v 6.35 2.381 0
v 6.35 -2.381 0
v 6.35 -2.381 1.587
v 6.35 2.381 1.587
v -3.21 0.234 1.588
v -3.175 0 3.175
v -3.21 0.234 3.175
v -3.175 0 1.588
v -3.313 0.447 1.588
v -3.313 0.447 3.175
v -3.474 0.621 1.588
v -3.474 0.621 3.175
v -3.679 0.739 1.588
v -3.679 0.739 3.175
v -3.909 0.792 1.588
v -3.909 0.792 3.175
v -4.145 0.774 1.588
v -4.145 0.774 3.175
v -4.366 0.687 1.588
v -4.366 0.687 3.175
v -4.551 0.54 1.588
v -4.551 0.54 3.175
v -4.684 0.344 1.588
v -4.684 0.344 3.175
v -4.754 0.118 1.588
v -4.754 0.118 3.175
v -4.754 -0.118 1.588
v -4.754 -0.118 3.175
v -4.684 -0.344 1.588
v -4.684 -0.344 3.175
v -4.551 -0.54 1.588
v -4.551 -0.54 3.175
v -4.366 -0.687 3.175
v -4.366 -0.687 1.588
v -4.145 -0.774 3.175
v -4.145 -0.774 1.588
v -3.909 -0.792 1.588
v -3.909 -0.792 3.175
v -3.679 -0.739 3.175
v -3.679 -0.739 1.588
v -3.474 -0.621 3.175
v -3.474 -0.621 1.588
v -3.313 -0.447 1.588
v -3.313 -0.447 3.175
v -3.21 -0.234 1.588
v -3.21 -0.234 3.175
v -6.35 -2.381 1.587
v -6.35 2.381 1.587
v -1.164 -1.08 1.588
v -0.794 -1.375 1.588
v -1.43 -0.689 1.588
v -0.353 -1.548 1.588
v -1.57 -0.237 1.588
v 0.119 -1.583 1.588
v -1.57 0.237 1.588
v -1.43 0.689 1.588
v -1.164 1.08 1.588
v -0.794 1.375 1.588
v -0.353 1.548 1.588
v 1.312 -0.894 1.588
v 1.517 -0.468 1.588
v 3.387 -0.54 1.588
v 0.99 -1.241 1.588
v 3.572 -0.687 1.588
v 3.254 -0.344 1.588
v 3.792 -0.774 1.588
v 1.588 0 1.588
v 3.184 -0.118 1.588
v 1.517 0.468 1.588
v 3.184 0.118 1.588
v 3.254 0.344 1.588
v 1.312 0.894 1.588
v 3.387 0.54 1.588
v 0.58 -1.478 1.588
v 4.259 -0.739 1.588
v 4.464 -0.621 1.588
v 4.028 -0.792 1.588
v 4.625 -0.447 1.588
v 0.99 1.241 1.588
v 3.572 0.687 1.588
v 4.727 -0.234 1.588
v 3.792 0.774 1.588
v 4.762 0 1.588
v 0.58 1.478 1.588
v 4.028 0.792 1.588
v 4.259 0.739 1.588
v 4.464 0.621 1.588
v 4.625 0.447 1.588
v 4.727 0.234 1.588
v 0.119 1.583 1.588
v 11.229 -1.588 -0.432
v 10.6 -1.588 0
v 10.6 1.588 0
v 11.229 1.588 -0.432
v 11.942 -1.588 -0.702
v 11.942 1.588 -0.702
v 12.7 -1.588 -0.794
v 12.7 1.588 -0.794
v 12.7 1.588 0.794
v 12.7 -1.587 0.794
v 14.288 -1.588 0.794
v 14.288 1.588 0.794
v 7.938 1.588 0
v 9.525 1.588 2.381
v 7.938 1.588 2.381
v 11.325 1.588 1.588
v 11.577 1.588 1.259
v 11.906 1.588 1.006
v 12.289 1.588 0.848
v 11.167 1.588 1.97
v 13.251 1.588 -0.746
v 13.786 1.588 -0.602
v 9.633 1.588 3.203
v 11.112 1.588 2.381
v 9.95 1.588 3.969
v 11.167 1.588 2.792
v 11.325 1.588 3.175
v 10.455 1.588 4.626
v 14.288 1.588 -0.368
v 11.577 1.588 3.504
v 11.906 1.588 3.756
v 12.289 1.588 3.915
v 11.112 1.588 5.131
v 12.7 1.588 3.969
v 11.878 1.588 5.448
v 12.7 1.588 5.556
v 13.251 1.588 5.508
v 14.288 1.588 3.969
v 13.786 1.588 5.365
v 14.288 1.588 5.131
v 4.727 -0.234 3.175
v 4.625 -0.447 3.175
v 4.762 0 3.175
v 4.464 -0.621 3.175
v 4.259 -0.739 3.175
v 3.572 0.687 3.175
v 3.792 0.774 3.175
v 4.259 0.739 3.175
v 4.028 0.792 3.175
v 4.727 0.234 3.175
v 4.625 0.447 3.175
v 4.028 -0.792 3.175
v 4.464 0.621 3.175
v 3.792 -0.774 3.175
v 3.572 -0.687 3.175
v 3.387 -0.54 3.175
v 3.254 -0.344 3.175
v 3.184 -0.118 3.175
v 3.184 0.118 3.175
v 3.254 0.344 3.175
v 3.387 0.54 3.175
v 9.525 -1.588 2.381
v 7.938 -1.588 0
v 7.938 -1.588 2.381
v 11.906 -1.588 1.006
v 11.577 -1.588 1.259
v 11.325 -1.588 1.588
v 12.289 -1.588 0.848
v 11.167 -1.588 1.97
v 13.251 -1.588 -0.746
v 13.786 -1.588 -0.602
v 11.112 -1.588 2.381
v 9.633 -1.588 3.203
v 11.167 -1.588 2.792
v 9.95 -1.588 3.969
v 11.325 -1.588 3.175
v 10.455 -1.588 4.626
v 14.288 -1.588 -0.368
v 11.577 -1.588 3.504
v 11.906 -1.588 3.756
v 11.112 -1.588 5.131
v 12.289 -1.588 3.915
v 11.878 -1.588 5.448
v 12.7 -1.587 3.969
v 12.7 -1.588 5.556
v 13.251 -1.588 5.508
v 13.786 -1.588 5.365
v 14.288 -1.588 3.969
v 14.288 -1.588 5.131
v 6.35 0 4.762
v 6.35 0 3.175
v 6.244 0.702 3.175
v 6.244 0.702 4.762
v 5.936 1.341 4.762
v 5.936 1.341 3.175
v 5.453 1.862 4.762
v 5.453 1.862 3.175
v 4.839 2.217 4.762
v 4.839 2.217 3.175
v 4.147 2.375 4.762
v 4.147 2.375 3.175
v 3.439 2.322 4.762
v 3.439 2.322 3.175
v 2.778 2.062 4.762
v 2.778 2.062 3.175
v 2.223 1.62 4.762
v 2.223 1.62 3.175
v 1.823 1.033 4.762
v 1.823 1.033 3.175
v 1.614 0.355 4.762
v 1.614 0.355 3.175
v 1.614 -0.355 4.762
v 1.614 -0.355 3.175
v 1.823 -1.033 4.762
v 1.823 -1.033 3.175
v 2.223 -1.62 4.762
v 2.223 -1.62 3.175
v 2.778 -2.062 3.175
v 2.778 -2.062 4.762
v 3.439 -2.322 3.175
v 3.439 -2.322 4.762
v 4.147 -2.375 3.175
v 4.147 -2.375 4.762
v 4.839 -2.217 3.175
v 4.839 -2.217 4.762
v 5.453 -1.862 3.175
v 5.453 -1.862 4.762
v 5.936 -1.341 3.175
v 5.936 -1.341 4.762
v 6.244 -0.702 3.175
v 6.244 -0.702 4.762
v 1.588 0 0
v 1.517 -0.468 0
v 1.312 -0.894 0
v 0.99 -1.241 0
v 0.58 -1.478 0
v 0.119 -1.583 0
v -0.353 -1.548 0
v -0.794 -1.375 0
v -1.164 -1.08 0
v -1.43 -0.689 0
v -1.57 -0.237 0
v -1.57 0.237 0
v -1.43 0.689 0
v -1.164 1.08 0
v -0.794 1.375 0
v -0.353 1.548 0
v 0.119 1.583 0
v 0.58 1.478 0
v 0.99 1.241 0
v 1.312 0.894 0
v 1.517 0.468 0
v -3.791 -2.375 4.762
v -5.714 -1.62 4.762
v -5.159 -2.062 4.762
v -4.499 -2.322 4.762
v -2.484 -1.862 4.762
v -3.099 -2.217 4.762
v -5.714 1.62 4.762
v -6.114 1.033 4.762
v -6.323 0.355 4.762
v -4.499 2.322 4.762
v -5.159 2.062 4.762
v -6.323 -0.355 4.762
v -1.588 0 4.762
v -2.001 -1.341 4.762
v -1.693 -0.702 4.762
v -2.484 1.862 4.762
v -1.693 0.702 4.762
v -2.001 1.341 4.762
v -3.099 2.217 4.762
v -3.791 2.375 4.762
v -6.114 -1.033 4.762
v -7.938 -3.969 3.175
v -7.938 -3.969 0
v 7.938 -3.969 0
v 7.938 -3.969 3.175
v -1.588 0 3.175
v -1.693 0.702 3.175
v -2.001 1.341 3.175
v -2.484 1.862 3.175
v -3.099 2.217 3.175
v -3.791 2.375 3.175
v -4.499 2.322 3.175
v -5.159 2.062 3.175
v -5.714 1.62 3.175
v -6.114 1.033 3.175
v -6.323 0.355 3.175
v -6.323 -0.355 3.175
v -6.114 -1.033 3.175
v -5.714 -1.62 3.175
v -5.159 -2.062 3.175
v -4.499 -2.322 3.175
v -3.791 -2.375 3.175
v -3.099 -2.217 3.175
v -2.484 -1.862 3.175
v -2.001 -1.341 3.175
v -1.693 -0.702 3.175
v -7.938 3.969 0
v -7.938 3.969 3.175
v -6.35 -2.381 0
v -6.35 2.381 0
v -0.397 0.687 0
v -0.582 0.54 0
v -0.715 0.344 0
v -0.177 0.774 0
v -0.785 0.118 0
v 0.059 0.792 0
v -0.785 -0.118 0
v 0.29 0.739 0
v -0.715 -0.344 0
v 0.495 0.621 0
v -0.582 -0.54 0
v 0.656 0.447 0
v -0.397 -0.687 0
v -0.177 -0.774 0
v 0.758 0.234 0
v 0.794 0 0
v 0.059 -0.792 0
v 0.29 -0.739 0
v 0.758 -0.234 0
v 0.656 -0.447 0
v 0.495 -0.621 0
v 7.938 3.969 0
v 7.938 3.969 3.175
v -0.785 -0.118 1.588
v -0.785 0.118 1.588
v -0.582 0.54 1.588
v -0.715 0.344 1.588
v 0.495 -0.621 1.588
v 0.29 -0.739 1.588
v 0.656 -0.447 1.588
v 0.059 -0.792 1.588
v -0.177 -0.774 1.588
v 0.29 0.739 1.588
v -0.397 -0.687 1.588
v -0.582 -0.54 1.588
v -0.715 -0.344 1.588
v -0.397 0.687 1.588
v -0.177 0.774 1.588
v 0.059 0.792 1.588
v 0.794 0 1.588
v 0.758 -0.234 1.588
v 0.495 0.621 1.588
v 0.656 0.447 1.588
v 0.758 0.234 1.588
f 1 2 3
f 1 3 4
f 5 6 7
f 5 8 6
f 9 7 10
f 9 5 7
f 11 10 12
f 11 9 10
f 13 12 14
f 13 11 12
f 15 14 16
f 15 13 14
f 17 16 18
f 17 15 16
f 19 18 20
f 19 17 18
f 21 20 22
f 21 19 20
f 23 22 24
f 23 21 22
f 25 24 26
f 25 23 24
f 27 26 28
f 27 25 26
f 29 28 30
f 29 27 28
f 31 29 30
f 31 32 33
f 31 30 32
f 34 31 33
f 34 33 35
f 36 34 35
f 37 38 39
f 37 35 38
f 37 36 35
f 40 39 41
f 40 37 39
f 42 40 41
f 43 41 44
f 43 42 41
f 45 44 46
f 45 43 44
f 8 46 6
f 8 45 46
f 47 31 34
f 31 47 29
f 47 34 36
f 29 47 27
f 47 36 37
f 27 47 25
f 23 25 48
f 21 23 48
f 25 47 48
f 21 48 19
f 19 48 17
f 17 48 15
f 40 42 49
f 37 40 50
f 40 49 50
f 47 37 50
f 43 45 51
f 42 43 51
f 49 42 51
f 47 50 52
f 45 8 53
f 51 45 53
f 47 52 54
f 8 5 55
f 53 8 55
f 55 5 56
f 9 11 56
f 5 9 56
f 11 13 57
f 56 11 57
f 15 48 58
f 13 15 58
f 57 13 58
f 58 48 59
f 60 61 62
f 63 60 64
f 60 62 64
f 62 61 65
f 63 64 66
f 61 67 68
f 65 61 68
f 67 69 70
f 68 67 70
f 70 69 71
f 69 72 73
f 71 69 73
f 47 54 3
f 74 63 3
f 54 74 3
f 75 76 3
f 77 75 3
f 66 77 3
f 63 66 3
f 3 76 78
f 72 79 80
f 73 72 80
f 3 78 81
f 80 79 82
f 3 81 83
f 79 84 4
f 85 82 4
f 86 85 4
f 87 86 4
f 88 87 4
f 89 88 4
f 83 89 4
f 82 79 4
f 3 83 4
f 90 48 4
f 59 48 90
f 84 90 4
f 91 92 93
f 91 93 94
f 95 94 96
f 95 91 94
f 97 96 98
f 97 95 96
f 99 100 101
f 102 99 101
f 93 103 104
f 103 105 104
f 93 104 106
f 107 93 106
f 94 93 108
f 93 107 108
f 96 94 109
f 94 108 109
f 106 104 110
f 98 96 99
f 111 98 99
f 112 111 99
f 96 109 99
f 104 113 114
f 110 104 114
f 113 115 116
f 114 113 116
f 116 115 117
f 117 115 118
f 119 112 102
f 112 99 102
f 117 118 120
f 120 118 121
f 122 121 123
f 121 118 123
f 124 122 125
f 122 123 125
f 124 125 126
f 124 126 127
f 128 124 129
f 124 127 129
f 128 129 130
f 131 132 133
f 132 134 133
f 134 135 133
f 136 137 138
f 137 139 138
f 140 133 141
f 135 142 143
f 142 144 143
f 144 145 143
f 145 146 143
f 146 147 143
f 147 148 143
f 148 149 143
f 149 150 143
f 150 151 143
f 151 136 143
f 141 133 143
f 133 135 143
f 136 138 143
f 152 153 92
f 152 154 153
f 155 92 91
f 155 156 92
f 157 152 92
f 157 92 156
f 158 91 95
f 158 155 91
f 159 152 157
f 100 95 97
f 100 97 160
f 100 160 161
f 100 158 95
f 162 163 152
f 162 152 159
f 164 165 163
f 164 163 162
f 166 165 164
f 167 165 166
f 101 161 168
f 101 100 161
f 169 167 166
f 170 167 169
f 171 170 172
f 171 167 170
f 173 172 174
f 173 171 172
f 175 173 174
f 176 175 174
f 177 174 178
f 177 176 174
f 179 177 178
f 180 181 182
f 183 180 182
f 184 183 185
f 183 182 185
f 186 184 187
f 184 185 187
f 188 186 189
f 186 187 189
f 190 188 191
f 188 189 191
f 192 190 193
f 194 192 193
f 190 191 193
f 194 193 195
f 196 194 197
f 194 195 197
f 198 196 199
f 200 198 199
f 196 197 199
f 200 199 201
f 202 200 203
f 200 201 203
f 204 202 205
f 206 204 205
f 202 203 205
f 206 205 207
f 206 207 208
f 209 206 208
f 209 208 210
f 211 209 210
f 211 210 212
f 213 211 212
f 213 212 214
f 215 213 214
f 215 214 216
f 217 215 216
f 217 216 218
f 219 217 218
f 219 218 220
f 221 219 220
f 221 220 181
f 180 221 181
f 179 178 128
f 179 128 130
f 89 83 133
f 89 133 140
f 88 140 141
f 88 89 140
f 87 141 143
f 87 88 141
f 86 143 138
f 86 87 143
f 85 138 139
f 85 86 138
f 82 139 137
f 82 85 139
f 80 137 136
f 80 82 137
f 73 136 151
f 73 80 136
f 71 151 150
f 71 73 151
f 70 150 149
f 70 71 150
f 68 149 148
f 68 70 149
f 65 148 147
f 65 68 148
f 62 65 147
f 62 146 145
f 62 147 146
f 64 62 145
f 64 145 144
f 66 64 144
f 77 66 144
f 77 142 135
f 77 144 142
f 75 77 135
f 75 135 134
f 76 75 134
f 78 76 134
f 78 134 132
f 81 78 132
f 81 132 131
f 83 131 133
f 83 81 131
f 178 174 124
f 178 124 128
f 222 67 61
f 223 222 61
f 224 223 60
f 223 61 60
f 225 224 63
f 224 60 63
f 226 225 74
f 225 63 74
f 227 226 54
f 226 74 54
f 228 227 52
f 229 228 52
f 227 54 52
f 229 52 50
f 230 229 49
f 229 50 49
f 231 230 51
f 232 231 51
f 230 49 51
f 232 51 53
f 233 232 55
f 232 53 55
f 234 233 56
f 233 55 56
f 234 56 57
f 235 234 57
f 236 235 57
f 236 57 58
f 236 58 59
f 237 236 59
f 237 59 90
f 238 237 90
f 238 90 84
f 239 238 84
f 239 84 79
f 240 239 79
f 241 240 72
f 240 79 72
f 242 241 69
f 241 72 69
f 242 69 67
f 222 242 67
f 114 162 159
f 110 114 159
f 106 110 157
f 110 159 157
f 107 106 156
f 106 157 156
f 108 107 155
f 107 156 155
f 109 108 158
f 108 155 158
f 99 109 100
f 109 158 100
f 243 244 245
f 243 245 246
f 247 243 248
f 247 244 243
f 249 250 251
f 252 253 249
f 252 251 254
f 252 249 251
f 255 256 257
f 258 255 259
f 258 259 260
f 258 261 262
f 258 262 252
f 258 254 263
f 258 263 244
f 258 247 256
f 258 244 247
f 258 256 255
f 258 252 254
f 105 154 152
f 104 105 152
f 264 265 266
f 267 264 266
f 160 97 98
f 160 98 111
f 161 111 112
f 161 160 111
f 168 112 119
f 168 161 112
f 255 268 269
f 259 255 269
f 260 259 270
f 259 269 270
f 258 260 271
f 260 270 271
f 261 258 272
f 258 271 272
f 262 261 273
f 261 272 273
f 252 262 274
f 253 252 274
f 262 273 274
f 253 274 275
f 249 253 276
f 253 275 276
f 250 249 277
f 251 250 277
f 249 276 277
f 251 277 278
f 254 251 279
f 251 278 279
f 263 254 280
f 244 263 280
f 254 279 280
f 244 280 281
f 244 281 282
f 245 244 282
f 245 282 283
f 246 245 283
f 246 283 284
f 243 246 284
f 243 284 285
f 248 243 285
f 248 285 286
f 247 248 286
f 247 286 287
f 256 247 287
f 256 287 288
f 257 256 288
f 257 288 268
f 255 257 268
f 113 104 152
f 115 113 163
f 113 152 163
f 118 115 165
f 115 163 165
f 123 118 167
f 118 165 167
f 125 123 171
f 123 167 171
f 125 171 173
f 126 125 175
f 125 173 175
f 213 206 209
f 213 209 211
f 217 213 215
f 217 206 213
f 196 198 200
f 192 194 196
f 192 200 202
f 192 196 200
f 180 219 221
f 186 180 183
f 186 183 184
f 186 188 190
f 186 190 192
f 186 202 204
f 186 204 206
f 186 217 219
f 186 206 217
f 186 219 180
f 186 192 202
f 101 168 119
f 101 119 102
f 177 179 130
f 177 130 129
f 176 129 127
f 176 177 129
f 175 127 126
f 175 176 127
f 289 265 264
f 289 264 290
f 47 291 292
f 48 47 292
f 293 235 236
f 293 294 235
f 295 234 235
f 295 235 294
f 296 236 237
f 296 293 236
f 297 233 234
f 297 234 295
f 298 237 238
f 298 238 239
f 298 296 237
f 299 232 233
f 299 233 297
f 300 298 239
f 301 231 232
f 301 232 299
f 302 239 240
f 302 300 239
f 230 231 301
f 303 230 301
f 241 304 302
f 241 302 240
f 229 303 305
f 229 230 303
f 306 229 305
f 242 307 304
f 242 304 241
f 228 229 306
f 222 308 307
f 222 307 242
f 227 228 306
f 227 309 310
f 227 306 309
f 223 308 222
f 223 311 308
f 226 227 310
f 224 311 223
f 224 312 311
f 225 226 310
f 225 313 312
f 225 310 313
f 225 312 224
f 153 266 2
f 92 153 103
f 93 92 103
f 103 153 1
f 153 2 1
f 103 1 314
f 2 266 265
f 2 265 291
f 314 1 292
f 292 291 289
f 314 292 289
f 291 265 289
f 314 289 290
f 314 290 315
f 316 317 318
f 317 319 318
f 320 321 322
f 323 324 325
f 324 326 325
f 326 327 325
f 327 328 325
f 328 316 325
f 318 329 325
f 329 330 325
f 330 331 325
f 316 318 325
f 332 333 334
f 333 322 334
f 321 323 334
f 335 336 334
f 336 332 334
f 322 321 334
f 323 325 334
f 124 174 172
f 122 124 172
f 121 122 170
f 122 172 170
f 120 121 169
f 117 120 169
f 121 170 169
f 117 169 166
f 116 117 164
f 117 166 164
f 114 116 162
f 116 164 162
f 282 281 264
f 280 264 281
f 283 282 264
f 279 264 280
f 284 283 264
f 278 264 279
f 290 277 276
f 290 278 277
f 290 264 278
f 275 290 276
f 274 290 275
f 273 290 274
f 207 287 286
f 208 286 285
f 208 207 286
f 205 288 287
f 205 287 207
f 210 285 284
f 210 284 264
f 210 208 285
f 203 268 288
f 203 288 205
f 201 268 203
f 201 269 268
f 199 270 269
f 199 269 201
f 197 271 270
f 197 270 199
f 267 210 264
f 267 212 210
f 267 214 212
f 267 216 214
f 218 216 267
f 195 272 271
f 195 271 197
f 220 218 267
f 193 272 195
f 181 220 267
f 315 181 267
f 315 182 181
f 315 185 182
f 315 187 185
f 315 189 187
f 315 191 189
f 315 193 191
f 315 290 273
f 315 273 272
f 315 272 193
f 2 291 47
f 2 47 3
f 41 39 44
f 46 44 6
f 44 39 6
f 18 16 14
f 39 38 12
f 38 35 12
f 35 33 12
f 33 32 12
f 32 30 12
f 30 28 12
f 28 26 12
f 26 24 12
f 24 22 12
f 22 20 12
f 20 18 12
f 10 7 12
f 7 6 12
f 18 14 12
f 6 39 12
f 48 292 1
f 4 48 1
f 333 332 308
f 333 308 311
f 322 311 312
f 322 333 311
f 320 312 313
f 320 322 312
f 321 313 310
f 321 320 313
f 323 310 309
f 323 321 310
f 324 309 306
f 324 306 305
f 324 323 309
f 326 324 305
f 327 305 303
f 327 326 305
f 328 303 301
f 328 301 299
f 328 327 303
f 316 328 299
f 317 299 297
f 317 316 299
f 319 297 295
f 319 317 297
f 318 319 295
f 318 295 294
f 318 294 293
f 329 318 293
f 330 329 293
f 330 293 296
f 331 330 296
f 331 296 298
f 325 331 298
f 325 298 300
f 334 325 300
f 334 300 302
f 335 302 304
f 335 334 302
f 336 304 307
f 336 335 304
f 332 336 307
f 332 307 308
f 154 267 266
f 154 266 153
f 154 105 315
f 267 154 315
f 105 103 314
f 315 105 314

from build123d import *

# Parameters (mm, degrees)
F0_W      = 15.875
F0_H      = 7.9375
F0_R      = 2.38125
F1_DEPTH  = 3.175
F2_DEPTH  = 4.7625
F3_T      = -1.5875
F4_R      = 1.5875
F4_R_2    = 0.79375
F5_DEPTH  = 1.5875
F6_W      = 1.5875
F6_H      = 6.35
F7_DEPTH  = 4.7625
F8_W      = 1.5875
F8_H      = 0.79375
F9_DEPTH  = 3.175
F10_DEPTH = 25.4


with BuildPart() as f1:
    # F0 (on Top) → F1 (new body)
    with BuildSketch(Plane.XY):
        Rectangle(F0_W, F0_H)
        with Locations((-3.96875, 0)):
            Circle(F0_R, mode=Mode.SUBTRACT)
        with Locations((3.96875, 0)):
            Circle(F0_R, mode=Mode.SUBTRACT)
    extrude(amount=F1_DEPTH)

    # F0 (on Top) → F2 (join)
    with BuildSketch(Plane.XY):
        with Locations((3.96875, 0)):
            Circle(F0_R)
        with Locations((-3.96875, 0)):
            Circle(F0_R)
    extrude(amount=F2_DEPTH)

    # F3
    f3_openings = [f1.faces().sort_by_distance(p)[0] for p in [
        (0, 0, 0),
    ]]
    offset(amount=F3_T, openings=f3_openings, kind=Kind.INTERSECTION)

    # F4 (on face) → F5 (join)
    with BuildSketch(Plane(origin=(0, 0, 1.5875), x_dir=(1, 0, 0), z_dir=(0, 0, -1))):
        Circle(F4_R)
        Circle(F4_R_2, mode=Mode.SUBTRACT)
    extrude(amount=F5_DEPTH)

    # F6 (on face) → F7 (join)
    with BuildSketch(Plane.YZ.offset(7.9375)):
        with Locations((0.79375, 3.175)):
            Rectangle(F6_W, F6_H)
        with Locations((-0.79375, 3.175)):
            Rectangle(F6_W, F6_H)
    extrude(amount=F7_DEPTH)

    # F8 (on face) → F9 (join)
    with BuildSketch(Plane.XZ.offset(1.5875)):
        with BuildLine():
            Line((12.7, 0), (10.5999348968, 0))
            ThreePointArc((10.5999348968, 0), (11.5774679849, -0.5886905508), (12.7, -0.79375))
            Line((12.7, -0.79375), (12.7, 0))
        make_face()
        with BuildLine():
            Line((12.7, 0), (12.7, -0.79375))
            ThreePointArc((12.7, -0.79375), (13.5217504682, -0.6855644985), (14.2875, -0.368380657))
            Line((14.2875, -0.368380657), (14.2875, 0))
            Line((14.2875, 0), (12.7, 0))
        make_face()
        with BuildLine():
            ThreePointArc((14.2875, 5.130880657), (13.5217504682, 5.4480644985), (12.7, 5.55625))
            Line((12.7, 5.55625), (12.7, 3.96875))
            Line((12.7, 3.96875), (14.2875, 3.96875))
            Line((14.2875, 3.96875), (14.2875, 5.130880657))
        make_face()
        with Locations((13.49375, 0.396875)):
            Rectangle(F8_W, F8_H)
    extrude(amount=-F9_DEPTH)

    # F8 (on face) → F10 (cut)
    with BuildSketch(Plane.XZ.offset(1.5875)):
        with BuildLine():
            Line((7.9375, 6.35), (7.9375, 3.175))
            Line((7.9375, 3.175), (7.9375, 2.38125))
            Line((7.9375, 2.38125), (9.525, 2.38125))
            ThreePointArc((9.525, 2.38125), (10.4549359697, 4.6263140303), (12.7, 5.55625))
            Line((12.7, 5.55625), (12.7, 6.35))
            Line((12.7, 6.35), (7.9375, 6.35))
        make_face()
        with BuildLine():
            Line((12.7, 2.38125), (11.1125, 2.38125))
            ThreePointArc((11.1125, 2.38125), (11.5774679849, 1.2587179849), (12.7, 0.79375))
            Line((12.7, 0.79375), (12.7, 2.38125))
        make_face()
        with BuildLine():
            ThreePointArc((12.7, 3.96875), (11.5774679849, 3.5037820151), (11.1125, 2.38125))
            Line((11.1125, 2.38125), (12.7, 2.38125))
            Line((12.7, 2.38125), (12.7, 3.96875))
        make_face()
    extrude(amount=-F10_DEPTH, mode=Mode.SUBTRACT)


solid = f1.part
